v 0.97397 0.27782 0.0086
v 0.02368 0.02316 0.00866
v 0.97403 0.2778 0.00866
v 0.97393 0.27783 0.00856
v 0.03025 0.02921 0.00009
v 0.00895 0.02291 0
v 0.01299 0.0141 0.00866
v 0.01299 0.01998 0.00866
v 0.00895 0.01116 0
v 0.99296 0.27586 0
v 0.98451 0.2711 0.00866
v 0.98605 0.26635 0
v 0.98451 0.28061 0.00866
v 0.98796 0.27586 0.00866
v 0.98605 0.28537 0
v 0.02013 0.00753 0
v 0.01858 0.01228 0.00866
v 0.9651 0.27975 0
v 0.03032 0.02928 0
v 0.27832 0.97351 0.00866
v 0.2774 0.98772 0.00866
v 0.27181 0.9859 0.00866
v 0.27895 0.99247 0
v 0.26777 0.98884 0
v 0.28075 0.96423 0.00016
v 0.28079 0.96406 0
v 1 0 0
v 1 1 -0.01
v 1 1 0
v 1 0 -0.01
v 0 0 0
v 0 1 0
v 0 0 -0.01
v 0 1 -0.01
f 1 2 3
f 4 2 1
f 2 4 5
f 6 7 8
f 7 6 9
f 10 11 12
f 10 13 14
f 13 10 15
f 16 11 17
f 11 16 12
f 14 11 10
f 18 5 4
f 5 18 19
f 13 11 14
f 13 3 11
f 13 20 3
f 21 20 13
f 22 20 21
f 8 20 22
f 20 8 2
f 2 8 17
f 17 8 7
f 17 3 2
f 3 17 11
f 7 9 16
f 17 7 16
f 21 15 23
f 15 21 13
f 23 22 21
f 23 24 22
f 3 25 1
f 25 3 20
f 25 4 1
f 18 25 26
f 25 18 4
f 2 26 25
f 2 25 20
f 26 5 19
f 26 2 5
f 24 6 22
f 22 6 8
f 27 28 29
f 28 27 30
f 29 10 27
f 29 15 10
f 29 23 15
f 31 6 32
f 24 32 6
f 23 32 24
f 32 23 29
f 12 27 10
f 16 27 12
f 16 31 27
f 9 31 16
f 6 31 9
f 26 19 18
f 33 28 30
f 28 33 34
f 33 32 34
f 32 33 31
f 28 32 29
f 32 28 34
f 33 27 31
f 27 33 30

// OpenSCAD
hull(){
    translate([0.0170370868555, 0.0170370868555]) sphere(0.01);
    translate([0.9829629131445, 0.275856131958]) sphere(0.01);
}
hull(){
    translate([0.9829629131445, 0.275856131958]) sphere(0.01);
    translate([0.275856131958, 0.9829629131445]) sphere(0.01);
}
hull(){
    translate([0.275856131958, 0.9829629131445]) sphere(0.01);
    translate([0.0170370868555, 0.0170370868555]) sphere(0.01);
}
translate([0,0,-0.01]) color([0.1,0.1,0.1]) cube([1,1,0.01]);
